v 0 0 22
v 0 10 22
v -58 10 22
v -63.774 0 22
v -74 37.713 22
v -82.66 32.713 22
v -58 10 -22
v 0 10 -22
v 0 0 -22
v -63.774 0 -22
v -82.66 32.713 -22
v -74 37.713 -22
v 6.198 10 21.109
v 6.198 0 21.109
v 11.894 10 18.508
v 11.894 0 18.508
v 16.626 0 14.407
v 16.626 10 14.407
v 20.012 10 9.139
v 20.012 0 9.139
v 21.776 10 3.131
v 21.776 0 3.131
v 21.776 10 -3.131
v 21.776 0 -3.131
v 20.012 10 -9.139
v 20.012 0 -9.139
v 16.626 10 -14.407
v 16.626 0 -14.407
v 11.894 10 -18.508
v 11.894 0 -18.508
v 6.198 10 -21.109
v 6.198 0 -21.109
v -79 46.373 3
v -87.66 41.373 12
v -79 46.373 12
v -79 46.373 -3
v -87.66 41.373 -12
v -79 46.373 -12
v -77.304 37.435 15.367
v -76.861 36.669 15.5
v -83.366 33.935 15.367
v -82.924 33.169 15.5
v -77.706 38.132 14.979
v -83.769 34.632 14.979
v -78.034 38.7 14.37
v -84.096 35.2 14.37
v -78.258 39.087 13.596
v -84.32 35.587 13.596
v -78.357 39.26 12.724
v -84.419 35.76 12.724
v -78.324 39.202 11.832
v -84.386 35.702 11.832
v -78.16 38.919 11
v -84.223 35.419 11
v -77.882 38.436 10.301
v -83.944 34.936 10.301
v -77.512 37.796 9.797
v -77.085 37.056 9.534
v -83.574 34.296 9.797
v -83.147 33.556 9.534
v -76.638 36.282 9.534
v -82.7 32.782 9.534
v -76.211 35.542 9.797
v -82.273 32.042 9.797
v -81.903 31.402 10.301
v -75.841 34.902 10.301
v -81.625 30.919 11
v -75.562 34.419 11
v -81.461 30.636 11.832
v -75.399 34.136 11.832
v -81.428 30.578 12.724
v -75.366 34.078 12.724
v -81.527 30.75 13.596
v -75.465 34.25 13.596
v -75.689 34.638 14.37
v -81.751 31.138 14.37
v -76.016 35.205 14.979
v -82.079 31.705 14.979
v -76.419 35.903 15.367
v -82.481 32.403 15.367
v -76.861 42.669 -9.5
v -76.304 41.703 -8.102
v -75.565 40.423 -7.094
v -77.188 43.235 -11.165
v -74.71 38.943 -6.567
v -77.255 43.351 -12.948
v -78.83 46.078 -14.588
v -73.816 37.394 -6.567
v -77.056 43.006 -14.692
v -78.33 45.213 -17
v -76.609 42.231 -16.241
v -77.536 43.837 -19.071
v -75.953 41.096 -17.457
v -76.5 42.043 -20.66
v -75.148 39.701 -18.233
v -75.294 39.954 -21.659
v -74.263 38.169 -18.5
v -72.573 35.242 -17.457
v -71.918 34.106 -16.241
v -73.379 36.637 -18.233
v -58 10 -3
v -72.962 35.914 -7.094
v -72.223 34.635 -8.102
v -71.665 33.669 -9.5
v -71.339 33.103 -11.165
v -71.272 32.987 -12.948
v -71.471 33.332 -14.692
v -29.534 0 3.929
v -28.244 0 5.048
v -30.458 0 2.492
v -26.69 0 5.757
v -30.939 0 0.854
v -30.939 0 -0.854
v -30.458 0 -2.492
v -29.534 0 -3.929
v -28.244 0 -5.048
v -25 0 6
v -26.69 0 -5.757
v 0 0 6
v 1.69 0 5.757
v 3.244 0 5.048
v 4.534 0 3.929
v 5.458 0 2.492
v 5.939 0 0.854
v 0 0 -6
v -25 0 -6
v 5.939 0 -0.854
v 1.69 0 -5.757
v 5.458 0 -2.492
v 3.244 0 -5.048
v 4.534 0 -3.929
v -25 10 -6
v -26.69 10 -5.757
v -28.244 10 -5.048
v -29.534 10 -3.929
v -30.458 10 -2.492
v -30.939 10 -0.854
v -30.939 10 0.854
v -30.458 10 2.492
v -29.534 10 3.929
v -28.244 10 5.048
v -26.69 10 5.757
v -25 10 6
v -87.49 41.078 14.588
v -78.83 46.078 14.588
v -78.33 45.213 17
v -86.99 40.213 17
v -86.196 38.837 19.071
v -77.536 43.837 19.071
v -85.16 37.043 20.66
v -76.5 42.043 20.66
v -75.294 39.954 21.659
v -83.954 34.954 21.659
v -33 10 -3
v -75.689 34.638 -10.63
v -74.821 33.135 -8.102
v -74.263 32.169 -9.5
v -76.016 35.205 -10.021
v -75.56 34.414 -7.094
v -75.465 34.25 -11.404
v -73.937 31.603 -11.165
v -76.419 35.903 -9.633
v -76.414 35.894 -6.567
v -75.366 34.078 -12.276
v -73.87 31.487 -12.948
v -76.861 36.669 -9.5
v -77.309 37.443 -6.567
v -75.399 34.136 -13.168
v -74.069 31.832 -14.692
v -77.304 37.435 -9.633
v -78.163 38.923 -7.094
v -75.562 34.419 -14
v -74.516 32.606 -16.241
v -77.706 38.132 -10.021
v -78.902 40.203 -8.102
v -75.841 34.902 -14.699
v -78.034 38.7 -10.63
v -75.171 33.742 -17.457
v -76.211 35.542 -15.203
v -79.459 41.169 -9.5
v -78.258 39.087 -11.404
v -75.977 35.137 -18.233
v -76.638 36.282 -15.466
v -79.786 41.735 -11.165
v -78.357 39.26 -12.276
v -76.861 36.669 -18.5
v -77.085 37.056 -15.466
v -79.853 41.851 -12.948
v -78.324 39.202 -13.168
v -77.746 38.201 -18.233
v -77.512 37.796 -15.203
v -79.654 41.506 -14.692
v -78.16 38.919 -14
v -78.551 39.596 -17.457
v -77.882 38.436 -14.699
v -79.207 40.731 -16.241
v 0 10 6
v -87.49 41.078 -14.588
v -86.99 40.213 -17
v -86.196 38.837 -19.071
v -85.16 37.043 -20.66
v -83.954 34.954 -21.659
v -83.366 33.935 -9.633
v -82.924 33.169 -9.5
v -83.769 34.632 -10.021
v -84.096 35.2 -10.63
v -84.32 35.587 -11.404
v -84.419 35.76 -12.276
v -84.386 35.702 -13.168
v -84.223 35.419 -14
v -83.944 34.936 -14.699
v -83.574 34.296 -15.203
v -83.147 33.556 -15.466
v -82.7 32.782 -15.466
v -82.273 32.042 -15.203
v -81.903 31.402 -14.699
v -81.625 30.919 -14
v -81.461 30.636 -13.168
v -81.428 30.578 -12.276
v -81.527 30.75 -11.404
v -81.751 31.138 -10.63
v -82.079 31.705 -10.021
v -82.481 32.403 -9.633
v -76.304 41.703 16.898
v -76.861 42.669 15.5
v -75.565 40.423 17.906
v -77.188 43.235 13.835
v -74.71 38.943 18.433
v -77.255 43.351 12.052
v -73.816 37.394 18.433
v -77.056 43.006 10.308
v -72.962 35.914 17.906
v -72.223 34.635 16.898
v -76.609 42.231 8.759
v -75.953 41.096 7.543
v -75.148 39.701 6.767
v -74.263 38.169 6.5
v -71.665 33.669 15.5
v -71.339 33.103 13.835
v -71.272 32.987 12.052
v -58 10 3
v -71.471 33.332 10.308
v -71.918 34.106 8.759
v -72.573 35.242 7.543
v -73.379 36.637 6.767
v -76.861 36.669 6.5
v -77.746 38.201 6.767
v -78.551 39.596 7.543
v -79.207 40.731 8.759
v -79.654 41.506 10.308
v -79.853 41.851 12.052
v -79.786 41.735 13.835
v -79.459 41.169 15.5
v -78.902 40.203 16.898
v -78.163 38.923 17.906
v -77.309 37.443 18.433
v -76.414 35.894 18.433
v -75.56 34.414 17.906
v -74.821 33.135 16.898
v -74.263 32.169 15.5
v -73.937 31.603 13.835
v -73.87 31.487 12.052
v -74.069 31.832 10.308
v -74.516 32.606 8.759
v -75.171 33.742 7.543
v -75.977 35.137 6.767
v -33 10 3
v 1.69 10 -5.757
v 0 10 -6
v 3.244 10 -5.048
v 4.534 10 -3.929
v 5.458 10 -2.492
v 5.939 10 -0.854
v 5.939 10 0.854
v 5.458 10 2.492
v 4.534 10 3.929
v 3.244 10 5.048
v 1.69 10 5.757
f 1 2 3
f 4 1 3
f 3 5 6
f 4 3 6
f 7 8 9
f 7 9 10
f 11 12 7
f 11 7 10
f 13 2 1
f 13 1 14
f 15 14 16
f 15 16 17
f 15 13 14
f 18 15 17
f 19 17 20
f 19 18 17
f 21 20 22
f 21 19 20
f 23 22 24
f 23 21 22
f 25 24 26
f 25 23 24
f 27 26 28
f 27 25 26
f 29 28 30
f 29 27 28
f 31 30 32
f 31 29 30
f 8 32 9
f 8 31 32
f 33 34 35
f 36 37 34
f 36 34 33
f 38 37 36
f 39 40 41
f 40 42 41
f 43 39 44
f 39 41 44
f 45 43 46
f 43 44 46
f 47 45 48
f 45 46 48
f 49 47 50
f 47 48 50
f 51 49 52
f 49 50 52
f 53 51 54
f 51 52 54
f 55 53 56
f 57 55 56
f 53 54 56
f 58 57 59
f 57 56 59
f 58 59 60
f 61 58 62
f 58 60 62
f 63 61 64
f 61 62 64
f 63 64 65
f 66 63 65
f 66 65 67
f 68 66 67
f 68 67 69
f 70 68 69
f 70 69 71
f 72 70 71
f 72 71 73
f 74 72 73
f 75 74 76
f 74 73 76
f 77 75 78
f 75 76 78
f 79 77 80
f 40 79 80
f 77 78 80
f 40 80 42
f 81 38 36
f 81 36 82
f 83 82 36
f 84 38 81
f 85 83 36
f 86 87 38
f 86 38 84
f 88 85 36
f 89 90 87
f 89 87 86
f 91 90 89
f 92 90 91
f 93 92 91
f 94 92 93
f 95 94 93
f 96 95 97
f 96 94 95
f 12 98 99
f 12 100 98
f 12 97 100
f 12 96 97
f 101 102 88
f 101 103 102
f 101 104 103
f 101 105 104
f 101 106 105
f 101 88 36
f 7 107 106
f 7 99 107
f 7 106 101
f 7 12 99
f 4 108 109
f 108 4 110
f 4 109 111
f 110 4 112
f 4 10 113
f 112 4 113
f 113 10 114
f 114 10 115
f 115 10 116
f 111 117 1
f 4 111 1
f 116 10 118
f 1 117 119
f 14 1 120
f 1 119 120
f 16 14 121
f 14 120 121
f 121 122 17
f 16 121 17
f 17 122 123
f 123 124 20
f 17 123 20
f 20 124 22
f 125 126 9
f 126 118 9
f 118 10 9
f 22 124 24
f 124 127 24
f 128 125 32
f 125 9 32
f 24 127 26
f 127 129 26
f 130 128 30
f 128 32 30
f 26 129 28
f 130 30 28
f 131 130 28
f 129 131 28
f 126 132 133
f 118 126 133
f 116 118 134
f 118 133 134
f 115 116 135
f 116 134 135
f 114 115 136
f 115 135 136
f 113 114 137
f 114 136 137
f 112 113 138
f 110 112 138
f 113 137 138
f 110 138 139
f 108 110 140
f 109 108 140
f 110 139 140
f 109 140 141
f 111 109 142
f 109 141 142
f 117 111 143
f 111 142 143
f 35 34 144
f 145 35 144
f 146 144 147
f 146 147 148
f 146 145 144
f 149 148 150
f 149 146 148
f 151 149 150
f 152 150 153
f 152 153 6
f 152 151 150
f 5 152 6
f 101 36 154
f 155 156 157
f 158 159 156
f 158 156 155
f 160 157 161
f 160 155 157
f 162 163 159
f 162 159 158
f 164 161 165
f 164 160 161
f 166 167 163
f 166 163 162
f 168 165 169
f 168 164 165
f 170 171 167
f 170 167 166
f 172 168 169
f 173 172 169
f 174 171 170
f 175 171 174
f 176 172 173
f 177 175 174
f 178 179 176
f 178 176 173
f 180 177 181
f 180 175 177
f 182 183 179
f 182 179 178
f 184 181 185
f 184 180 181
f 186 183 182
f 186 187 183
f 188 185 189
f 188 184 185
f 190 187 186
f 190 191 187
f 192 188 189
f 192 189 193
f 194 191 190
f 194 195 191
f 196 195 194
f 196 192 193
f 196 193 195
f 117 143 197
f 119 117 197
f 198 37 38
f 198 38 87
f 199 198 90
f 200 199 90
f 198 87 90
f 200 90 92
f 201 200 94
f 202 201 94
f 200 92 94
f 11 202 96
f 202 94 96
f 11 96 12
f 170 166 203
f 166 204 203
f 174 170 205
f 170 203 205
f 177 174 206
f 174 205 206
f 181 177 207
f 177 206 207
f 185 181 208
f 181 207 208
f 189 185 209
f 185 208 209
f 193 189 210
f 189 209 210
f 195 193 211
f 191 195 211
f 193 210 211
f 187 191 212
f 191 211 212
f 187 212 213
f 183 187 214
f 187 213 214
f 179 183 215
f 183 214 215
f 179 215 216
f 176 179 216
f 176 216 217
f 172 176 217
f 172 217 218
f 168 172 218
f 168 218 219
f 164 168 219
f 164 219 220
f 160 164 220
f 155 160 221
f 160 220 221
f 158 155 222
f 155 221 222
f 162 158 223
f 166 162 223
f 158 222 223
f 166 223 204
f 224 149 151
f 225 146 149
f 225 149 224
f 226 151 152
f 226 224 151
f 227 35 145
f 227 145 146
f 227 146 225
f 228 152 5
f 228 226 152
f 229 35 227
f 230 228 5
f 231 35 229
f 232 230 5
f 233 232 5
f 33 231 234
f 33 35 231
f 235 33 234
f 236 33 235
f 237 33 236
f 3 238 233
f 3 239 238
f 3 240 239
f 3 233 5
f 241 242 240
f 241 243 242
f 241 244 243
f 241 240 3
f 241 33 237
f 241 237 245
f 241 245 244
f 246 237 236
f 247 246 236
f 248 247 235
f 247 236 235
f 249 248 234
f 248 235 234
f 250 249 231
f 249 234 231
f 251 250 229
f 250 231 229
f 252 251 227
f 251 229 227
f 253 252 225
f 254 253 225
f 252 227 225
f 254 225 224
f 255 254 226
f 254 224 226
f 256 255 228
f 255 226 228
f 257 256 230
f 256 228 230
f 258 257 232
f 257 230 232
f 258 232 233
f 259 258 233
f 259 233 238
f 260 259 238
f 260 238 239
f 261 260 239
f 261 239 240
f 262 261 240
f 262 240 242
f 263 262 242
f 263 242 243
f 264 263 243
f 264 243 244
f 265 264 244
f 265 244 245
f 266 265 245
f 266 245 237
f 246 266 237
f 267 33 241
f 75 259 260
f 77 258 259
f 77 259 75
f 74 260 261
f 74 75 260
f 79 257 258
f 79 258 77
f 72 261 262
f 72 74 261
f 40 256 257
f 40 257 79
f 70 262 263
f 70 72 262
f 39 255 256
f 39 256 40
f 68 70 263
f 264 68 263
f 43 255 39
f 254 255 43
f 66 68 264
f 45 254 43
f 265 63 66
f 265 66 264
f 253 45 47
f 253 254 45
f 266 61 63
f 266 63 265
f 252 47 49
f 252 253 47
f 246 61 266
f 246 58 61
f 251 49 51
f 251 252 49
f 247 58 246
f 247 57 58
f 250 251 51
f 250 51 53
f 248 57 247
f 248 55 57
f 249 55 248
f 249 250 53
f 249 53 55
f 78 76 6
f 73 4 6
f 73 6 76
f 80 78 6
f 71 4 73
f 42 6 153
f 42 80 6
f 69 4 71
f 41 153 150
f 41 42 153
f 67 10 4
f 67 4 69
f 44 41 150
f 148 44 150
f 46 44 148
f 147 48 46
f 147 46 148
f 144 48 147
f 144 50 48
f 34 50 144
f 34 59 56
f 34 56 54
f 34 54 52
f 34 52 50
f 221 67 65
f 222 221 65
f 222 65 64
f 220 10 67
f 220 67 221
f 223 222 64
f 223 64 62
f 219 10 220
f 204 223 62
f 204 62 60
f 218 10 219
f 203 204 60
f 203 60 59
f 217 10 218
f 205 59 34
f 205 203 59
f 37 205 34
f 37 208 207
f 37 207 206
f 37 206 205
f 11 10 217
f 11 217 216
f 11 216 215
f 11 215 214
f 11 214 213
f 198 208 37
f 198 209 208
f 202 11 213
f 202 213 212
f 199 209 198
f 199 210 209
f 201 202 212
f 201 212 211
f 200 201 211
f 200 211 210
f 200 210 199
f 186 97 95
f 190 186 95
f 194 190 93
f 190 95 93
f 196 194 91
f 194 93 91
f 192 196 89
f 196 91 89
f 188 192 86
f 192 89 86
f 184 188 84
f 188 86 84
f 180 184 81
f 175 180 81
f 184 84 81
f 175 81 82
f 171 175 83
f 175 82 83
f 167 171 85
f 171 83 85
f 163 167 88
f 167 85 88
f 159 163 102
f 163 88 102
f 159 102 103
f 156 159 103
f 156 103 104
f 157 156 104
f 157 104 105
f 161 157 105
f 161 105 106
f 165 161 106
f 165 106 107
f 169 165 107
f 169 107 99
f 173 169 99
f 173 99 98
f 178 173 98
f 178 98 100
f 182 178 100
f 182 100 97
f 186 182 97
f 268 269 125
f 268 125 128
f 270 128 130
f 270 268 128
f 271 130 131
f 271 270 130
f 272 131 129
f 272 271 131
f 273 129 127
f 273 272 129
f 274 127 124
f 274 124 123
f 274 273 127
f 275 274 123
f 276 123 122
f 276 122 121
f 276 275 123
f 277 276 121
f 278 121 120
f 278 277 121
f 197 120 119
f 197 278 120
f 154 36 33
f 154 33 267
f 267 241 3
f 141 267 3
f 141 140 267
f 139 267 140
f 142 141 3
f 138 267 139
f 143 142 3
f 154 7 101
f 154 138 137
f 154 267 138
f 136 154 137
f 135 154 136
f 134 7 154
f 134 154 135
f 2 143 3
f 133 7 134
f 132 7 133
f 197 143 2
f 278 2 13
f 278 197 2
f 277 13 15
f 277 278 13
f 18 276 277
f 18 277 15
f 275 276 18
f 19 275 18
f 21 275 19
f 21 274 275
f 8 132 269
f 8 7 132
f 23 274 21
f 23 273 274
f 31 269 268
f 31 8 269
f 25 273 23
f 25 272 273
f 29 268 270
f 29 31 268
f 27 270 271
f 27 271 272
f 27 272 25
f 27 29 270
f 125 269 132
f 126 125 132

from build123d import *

# Parameters (mm, degrees)
BOSS_EXTRUDE1_DEPTH                     = 22
BOSS_EXTRUDE1_DEPTH_BACK                = 22
BOSS_EXTRUDE3_DEPTH                     = 10
CUT_EXTRUDE2_DEPTH                      = 10
RIB1_REACH                              = 103.581
SKETCH4_WALL_W                          = 263.805794056
SKETCH4_WALL_H                          = 6
CBORE_FOR_M5_HEX_HEAD_BOLT1_D           = 6
CBORE_FOR_M5_HEX_HEAD_BOLT1_DEPTH       = 10
CBORE_FOR_M5_HEX_HEAD_BOLT1_CBORE_D     = 12
CBORE_FOR_M5_HEX_HEAD_BOLT1_CBORE_DEPTH = 3
CBORE_FOR_M5_HEX_HEAD_BOLT1_TIP         = 1.732050808
FILLET1_R                               = 10


with BuildPart() as part:
    # Sketch1 → Boss-Extrude1 (new, two sides: drawn at the far end of the back side and taken through both)
    with BuildSketch(Plane.XY.offset(-BOSS_EXTRUDE1_DEPTH_BACK)):
        Polygon((0, 0), (-63.773502692, 0), (-87.660254038, 41.373066959), (-79, 46.373066959), (-58, 10), (0, 10), align=None)
    extrude(amount=BOSS_EXTRUDE1_DEPTH + BOSS_EXTRUDE1_DEPTH_BACK)

    # Sketch3 → Boss-Extrude3 (add)
    with BuildSketch(Plane(origin=(0, 10, 0), x_dir=(1, 0, 0), z_dir=(0, 1, 0))):
        with BuildLine():
            Line((0, -6), (0, -22))
            ThreePointArc((0, -22), (22, 0), (0, 22))
            Line((0, 22), (0, 6))
            ThreePointArc((0, 6), (6, 0), (0, -6))
        make_face()
    extrude(amount=-BOSS_EXTRUDE3_DEPTH)

    # Sketch3<3> → Cut-Extrude2 (cut)
    with BuildSketch(Plane(origin=(0, 10, 0), x_dir=(1, 0, 0), z_dir=(0, 1, 0))):
        with BuildLine():
            ThreePointArc((0, -6), (6, 0), (0, 6))
            Line((0, 6), (-25, 6))
            ThreePointArc((-25, 6), (-31, 0), (-25, -6))
            Line((-25, -6), (0, -6))
        make_face()
    extrude(amount=-CUT_EXTRUDE2_DEPTH, mode=Mode.SUBTRACT)

    # Sketch4 wall → Rib1 (add, up to next)
    with BuildSketch(Plane(origin=(-56, 28.186533479, 0), x_dir=(0.784407511397, -0.620245802939, 0), z_dir=(0.620245802939, 0.784407511397, 0)), mode=Mode.PRIVATE) as rib1_sk1:
        Rectangle(SKETCH4_WALL_W, SKETCH4_WALL_H)
    rib1_tool1 = extrude(rib1_sk1.sketch, amount=-RIB1_REACH, mode=Mode.PRIVATE) - part.part
    add(rib1_tool1.solids().sort_by_distance((-56, 28.186533479, 0))[0])

    # CBORE for M5 Hex Head Bolt1
    with Locations(Plane(origin=(-39.169872981, -22.61473671, 0), x_dir=(0, 0, -1), z_dir=(0.8660254037844395, 0.49999999999999856, 0))):
        with Locations((-12.5, 70.186913626), (12.5, 70.186913626)):
            CounterBoreHole(CBORE_FOR_M5_HEX_HEAD_BOLT1_D / 2, CBORE_FOR_M5_HEX_HEAD_BOLT1_CBORE_D / 2, CBORE_FOR_M5_HEX_HEAD_BOLT1_CBORE_DEPTH, depth=CBORE_FOR_M5_HEX_HEAD_BOLT1_DEPTH)
            with Locations((0, 0, -(CBORE_FOR_M5_HEX_HEAD_BOLT1_DEPTH + CBORE_FOR_M5_HEX_HEAD_BOLT1_TIP / 2))):  # 120° drill point
                Cone(0, CBORE_FOR_M5_HEX_HEAD_BOLT1_D / 2, CBORE_FOR_M5_HEX_HEAD_BOLT1_TIP, mode=Mode.SUBTRACT)

    # Fillet1
    fillet1_edges = [part.edges().sort_by_distance(p)[0] for p in [
        (-83.330127019, 43.873066959, -22),
        (-83.330127019, 43.873066959, 22),
    ]]
    fillet(fillet1_edges, radius=FILLET1_R)


solid = part.part
